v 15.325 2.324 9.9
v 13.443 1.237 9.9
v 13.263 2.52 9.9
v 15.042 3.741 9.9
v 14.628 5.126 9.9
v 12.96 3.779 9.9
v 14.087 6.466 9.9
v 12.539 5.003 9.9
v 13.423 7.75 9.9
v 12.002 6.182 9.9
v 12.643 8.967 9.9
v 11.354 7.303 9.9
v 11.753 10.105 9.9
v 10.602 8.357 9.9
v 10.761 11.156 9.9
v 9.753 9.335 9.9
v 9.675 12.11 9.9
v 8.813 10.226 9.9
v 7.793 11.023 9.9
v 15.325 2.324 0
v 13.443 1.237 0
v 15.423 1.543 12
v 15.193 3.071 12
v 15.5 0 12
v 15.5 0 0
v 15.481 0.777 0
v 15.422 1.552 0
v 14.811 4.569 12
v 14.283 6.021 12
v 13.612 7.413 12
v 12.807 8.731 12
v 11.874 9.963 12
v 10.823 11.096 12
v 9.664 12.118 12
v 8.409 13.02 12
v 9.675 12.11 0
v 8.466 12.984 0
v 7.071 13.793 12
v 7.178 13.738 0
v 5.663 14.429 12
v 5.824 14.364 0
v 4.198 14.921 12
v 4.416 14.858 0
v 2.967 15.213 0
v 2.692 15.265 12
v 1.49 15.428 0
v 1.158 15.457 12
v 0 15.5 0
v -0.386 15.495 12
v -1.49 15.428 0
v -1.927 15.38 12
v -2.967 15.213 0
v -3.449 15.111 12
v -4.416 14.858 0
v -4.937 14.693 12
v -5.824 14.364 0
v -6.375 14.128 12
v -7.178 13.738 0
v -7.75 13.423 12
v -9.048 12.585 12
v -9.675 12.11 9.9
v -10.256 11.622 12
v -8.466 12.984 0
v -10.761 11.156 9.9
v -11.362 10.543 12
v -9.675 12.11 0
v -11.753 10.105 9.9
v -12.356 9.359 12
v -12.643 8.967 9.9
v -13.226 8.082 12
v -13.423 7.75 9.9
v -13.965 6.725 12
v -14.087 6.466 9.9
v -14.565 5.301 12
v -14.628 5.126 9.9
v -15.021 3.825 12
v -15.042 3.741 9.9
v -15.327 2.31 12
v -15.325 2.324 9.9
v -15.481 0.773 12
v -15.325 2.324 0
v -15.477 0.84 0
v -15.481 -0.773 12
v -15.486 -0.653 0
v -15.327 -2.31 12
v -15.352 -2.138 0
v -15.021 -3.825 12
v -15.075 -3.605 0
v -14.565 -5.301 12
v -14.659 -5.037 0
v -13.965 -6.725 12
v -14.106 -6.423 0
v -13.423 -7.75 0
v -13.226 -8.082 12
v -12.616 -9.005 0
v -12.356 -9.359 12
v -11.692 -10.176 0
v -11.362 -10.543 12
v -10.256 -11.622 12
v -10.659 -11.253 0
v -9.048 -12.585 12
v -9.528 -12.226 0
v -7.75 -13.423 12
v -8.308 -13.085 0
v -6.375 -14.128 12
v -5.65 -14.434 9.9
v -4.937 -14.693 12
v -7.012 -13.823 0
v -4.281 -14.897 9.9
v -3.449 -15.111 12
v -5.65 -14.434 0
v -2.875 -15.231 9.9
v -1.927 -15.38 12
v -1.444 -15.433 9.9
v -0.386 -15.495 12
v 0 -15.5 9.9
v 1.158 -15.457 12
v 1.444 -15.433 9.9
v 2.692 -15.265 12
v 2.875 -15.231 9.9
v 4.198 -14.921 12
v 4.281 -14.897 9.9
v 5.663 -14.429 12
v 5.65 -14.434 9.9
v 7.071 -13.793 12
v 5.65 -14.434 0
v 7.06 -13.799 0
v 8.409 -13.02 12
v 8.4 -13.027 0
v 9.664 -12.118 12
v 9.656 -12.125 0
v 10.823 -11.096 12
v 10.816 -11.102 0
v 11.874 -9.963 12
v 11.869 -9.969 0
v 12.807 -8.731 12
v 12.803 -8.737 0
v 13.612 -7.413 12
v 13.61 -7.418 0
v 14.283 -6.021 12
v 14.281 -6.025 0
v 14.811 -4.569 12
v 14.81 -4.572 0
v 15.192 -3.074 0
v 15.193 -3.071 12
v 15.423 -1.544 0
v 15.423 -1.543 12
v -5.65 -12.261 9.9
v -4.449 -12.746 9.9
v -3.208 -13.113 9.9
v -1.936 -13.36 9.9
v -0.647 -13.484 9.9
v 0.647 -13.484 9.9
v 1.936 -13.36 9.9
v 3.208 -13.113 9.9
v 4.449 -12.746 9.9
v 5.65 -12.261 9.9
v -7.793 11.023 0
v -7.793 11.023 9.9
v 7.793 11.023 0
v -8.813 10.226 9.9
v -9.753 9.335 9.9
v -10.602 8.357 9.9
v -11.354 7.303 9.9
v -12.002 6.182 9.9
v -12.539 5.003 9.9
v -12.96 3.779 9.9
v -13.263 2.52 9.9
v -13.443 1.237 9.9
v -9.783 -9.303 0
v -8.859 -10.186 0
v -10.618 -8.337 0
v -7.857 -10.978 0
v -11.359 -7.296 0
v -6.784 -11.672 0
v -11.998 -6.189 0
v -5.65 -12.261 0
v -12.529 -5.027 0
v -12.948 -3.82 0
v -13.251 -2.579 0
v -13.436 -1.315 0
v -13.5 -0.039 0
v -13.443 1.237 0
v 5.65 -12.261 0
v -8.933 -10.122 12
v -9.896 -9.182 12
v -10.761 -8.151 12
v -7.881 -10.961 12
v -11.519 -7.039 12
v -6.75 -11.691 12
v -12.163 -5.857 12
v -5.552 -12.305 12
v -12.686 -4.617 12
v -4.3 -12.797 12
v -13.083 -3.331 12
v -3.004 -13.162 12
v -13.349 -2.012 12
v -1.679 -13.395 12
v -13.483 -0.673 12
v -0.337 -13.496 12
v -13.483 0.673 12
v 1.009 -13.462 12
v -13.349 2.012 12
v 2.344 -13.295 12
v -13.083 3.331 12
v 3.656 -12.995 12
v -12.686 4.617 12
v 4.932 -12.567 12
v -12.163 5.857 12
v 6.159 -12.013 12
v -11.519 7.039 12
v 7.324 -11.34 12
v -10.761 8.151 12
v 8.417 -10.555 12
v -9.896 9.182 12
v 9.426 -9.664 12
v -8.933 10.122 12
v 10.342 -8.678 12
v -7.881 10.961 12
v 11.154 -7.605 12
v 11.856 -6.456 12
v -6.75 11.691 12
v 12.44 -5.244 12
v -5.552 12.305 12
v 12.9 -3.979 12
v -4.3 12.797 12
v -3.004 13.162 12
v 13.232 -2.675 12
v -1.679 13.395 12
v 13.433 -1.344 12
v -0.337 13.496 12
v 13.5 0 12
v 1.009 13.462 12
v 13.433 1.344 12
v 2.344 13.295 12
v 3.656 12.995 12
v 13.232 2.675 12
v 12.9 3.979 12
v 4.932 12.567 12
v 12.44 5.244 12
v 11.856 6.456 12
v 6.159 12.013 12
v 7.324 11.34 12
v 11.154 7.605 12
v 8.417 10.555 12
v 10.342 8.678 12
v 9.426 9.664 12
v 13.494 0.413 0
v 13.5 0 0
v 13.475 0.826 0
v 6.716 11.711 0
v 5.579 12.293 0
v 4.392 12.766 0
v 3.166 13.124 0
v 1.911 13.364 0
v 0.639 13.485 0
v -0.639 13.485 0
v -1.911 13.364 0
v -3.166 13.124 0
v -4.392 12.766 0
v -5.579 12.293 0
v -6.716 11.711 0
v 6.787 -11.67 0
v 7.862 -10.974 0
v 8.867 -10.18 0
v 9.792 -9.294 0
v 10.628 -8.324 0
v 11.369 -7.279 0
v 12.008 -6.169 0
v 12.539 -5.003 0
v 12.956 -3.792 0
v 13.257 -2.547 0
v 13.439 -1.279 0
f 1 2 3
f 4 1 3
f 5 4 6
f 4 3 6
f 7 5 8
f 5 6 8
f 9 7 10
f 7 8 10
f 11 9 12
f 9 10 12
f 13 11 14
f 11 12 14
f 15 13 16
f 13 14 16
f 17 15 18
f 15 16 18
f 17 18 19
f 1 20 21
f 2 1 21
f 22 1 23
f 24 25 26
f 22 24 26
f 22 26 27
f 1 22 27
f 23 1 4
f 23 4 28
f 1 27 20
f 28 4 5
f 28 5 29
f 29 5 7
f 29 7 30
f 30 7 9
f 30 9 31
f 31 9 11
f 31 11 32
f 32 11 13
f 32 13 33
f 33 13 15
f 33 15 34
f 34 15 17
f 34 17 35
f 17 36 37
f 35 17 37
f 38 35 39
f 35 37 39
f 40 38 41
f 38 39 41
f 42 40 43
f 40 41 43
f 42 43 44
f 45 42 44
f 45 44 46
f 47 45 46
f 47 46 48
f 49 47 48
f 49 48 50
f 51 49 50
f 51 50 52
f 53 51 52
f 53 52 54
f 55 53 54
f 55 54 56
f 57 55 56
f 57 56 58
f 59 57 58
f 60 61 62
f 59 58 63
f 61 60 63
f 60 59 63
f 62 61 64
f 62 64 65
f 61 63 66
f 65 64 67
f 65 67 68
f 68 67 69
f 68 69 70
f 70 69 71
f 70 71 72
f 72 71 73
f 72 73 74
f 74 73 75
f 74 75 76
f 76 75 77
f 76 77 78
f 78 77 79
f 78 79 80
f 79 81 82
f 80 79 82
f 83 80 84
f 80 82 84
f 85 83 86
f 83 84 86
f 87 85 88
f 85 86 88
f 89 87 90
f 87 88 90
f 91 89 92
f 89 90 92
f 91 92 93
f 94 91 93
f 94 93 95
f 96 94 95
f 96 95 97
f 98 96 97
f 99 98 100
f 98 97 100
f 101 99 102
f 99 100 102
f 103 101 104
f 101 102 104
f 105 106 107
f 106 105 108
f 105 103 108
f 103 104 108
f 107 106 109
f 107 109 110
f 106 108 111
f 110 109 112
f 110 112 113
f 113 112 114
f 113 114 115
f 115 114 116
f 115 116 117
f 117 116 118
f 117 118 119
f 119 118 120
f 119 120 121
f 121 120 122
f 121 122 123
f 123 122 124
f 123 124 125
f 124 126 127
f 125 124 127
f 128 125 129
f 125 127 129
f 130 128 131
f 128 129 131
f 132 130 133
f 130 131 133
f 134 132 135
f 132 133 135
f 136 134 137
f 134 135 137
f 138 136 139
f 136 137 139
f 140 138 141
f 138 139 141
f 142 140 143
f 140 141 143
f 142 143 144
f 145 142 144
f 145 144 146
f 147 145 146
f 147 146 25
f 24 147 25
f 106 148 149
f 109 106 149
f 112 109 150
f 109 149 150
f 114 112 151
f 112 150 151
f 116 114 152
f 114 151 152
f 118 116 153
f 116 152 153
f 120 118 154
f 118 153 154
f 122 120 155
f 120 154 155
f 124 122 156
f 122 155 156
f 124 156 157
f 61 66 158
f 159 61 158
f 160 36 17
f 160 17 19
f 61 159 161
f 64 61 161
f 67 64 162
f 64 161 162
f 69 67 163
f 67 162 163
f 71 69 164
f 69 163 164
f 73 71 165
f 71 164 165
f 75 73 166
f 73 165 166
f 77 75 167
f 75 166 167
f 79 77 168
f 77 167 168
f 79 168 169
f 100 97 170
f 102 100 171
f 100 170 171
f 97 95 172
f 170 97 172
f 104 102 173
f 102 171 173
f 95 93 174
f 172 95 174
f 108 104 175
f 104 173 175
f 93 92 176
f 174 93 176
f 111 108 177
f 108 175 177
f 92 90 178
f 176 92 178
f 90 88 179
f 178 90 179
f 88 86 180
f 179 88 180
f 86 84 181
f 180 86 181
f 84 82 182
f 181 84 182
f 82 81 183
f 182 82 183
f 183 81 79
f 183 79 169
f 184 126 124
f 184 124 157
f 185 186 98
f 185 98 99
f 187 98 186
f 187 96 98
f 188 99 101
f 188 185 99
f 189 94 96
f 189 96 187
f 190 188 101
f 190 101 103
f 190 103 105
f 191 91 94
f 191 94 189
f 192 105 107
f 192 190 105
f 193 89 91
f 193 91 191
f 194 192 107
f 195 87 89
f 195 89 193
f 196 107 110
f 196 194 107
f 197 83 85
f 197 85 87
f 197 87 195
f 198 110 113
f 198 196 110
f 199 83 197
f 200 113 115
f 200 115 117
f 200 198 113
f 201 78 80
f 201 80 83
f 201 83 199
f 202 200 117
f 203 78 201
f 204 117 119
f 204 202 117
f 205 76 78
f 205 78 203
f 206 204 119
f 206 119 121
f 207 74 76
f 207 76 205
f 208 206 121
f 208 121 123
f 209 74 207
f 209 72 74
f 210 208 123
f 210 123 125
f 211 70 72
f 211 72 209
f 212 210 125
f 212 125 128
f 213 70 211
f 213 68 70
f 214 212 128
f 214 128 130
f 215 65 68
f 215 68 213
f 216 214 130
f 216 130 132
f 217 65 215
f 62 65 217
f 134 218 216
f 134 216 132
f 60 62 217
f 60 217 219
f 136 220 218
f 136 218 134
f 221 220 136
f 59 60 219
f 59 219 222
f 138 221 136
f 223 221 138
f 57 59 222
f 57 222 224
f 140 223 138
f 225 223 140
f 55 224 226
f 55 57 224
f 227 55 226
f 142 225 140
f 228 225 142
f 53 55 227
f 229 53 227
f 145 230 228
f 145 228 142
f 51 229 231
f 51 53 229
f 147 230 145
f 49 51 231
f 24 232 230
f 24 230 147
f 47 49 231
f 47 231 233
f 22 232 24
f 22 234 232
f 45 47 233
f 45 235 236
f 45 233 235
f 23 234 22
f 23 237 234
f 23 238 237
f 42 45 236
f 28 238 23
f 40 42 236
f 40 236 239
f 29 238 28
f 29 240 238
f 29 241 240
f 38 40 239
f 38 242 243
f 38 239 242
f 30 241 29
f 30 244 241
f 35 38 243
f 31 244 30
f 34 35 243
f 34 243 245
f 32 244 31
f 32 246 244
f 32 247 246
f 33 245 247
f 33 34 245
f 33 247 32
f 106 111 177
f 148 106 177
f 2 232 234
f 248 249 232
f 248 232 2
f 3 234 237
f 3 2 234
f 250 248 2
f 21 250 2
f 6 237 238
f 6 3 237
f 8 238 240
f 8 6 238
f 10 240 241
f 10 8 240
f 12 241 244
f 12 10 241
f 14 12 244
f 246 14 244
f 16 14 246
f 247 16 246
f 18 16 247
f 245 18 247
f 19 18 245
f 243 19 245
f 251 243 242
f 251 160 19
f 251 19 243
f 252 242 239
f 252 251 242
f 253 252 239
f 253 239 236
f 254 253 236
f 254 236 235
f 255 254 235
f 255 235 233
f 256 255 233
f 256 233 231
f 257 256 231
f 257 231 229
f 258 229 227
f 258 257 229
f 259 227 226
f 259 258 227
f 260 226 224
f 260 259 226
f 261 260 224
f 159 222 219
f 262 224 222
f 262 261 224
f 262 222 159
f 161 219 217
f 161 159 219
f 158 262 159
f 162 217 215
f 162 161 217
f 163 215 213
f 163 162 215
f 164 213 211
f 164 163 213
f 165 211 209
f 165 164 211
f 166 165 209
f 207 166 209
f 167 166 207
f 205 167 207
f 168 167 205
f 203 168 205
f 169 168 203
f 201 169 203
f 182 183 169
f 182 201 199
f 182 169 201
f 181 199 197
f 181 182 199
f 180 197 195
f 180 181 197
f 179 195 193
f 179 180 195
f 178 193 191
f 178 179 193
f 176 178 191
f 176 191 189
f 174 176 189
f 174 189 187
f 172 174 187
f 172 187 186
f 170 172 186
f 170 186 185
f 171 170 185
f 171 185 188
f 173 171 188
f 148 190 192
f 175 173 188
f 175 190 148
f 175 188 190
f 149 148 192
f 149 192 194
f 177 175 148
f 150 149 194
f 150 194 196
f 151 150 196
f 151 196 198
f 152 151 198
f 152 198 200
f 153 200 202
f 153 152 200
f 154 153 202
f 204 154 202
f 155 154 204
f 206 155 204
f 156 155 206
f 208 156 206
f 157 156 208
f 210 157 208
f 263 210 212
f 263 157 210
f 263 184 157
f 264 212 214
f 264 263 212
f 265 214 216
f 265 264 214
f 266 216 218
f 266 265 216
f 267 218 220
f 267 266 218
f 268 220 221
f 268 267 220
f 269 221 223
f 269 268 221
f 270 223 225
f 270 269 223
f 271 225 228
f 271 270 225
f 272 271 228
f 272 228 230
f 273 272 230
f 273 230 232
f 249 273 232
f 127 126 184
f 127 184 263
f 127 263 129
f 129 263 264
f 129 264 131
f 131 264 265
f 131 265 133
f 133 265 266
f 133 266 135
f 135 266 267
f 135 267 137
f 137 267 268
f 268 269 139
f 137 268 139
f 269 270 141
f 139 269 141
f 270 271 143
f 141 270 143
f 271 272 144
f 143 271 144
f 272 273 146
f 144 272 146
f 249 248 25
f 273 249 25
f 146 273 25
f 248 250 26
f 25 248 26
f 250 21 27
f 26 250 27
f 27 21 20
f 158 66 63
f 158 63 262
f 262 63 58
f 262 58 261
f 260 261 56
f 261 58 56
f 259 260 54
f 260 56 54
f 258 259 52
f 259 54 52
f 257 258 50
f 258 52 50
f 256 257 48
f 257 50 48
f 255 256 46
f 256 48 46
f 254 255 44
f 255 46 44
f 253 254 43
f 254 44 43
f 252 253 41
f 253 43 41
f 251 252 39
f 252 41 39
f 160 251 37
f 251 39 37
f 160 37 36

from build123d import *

# Parameters (mm, degrees)
F0_R      = 15.5
F0_R_2    = 13.5
F1_DEPTH  = 10
F3_R      = 15.5
F3_R_2    = 13.5
F4_DEPTH  = 2
F5_W      = 11.3
F5_H      = 18.3407559019
F6_DEPTH  = 9.9
F7_COUNT  = 3
F9_R      = 8
F10_DEPTH = 25


# Not quite as in the source:
# - the program builds the solid bodies; features that only make, move or delete a surface that nothing else refers to are left out


with BuildPart() as f1:
    # F0 (on Top) → F1 (new body)
    with BuildSketch(Plane.XY):
        Circle(F0_R)
        Circle(F0_R_2, mode=Mode.SUBTRACT)
    extrude(amount=F1_DEPTH)

    # F3 (on offset) → F4 (join)
    with BuildSketch(Plane.XY.offset(10)):
        Circle(F3_R)
        Circle(F3_R_2, mode=Mode.SUBTRACT)
    extrude(amount=F4_DEPTH)

    # F5 (on Top) → F6 (cut)
    with BuildSketch(Plane.XY):
        with Locations((-1.81e-07, -13.0000018069)):
            Rectangle(F5_W, F5_H)
    f6 = extrude(amount=F6_DEPTH, mode=Mode.SUBTRACT)

    # F7: F6 ×3 about axis
    f7_axis = Axis((0, 0, 0), (0, 0, -1))
    for i in range(1, F7_COUNT):
        add(f6.rotate(f7_axis, i * 360 / F7_COUNT), mode=Mode.SUBTRACT)

    # F9 (on offset) → F10 (cut)
    with BuildSketch(Plane.XY.offset(22)):
        Circle(F9_R)
    extrude(amount=-F10_DEPTH, mode=Mode.SUBTRACT)


solid = f1.part
